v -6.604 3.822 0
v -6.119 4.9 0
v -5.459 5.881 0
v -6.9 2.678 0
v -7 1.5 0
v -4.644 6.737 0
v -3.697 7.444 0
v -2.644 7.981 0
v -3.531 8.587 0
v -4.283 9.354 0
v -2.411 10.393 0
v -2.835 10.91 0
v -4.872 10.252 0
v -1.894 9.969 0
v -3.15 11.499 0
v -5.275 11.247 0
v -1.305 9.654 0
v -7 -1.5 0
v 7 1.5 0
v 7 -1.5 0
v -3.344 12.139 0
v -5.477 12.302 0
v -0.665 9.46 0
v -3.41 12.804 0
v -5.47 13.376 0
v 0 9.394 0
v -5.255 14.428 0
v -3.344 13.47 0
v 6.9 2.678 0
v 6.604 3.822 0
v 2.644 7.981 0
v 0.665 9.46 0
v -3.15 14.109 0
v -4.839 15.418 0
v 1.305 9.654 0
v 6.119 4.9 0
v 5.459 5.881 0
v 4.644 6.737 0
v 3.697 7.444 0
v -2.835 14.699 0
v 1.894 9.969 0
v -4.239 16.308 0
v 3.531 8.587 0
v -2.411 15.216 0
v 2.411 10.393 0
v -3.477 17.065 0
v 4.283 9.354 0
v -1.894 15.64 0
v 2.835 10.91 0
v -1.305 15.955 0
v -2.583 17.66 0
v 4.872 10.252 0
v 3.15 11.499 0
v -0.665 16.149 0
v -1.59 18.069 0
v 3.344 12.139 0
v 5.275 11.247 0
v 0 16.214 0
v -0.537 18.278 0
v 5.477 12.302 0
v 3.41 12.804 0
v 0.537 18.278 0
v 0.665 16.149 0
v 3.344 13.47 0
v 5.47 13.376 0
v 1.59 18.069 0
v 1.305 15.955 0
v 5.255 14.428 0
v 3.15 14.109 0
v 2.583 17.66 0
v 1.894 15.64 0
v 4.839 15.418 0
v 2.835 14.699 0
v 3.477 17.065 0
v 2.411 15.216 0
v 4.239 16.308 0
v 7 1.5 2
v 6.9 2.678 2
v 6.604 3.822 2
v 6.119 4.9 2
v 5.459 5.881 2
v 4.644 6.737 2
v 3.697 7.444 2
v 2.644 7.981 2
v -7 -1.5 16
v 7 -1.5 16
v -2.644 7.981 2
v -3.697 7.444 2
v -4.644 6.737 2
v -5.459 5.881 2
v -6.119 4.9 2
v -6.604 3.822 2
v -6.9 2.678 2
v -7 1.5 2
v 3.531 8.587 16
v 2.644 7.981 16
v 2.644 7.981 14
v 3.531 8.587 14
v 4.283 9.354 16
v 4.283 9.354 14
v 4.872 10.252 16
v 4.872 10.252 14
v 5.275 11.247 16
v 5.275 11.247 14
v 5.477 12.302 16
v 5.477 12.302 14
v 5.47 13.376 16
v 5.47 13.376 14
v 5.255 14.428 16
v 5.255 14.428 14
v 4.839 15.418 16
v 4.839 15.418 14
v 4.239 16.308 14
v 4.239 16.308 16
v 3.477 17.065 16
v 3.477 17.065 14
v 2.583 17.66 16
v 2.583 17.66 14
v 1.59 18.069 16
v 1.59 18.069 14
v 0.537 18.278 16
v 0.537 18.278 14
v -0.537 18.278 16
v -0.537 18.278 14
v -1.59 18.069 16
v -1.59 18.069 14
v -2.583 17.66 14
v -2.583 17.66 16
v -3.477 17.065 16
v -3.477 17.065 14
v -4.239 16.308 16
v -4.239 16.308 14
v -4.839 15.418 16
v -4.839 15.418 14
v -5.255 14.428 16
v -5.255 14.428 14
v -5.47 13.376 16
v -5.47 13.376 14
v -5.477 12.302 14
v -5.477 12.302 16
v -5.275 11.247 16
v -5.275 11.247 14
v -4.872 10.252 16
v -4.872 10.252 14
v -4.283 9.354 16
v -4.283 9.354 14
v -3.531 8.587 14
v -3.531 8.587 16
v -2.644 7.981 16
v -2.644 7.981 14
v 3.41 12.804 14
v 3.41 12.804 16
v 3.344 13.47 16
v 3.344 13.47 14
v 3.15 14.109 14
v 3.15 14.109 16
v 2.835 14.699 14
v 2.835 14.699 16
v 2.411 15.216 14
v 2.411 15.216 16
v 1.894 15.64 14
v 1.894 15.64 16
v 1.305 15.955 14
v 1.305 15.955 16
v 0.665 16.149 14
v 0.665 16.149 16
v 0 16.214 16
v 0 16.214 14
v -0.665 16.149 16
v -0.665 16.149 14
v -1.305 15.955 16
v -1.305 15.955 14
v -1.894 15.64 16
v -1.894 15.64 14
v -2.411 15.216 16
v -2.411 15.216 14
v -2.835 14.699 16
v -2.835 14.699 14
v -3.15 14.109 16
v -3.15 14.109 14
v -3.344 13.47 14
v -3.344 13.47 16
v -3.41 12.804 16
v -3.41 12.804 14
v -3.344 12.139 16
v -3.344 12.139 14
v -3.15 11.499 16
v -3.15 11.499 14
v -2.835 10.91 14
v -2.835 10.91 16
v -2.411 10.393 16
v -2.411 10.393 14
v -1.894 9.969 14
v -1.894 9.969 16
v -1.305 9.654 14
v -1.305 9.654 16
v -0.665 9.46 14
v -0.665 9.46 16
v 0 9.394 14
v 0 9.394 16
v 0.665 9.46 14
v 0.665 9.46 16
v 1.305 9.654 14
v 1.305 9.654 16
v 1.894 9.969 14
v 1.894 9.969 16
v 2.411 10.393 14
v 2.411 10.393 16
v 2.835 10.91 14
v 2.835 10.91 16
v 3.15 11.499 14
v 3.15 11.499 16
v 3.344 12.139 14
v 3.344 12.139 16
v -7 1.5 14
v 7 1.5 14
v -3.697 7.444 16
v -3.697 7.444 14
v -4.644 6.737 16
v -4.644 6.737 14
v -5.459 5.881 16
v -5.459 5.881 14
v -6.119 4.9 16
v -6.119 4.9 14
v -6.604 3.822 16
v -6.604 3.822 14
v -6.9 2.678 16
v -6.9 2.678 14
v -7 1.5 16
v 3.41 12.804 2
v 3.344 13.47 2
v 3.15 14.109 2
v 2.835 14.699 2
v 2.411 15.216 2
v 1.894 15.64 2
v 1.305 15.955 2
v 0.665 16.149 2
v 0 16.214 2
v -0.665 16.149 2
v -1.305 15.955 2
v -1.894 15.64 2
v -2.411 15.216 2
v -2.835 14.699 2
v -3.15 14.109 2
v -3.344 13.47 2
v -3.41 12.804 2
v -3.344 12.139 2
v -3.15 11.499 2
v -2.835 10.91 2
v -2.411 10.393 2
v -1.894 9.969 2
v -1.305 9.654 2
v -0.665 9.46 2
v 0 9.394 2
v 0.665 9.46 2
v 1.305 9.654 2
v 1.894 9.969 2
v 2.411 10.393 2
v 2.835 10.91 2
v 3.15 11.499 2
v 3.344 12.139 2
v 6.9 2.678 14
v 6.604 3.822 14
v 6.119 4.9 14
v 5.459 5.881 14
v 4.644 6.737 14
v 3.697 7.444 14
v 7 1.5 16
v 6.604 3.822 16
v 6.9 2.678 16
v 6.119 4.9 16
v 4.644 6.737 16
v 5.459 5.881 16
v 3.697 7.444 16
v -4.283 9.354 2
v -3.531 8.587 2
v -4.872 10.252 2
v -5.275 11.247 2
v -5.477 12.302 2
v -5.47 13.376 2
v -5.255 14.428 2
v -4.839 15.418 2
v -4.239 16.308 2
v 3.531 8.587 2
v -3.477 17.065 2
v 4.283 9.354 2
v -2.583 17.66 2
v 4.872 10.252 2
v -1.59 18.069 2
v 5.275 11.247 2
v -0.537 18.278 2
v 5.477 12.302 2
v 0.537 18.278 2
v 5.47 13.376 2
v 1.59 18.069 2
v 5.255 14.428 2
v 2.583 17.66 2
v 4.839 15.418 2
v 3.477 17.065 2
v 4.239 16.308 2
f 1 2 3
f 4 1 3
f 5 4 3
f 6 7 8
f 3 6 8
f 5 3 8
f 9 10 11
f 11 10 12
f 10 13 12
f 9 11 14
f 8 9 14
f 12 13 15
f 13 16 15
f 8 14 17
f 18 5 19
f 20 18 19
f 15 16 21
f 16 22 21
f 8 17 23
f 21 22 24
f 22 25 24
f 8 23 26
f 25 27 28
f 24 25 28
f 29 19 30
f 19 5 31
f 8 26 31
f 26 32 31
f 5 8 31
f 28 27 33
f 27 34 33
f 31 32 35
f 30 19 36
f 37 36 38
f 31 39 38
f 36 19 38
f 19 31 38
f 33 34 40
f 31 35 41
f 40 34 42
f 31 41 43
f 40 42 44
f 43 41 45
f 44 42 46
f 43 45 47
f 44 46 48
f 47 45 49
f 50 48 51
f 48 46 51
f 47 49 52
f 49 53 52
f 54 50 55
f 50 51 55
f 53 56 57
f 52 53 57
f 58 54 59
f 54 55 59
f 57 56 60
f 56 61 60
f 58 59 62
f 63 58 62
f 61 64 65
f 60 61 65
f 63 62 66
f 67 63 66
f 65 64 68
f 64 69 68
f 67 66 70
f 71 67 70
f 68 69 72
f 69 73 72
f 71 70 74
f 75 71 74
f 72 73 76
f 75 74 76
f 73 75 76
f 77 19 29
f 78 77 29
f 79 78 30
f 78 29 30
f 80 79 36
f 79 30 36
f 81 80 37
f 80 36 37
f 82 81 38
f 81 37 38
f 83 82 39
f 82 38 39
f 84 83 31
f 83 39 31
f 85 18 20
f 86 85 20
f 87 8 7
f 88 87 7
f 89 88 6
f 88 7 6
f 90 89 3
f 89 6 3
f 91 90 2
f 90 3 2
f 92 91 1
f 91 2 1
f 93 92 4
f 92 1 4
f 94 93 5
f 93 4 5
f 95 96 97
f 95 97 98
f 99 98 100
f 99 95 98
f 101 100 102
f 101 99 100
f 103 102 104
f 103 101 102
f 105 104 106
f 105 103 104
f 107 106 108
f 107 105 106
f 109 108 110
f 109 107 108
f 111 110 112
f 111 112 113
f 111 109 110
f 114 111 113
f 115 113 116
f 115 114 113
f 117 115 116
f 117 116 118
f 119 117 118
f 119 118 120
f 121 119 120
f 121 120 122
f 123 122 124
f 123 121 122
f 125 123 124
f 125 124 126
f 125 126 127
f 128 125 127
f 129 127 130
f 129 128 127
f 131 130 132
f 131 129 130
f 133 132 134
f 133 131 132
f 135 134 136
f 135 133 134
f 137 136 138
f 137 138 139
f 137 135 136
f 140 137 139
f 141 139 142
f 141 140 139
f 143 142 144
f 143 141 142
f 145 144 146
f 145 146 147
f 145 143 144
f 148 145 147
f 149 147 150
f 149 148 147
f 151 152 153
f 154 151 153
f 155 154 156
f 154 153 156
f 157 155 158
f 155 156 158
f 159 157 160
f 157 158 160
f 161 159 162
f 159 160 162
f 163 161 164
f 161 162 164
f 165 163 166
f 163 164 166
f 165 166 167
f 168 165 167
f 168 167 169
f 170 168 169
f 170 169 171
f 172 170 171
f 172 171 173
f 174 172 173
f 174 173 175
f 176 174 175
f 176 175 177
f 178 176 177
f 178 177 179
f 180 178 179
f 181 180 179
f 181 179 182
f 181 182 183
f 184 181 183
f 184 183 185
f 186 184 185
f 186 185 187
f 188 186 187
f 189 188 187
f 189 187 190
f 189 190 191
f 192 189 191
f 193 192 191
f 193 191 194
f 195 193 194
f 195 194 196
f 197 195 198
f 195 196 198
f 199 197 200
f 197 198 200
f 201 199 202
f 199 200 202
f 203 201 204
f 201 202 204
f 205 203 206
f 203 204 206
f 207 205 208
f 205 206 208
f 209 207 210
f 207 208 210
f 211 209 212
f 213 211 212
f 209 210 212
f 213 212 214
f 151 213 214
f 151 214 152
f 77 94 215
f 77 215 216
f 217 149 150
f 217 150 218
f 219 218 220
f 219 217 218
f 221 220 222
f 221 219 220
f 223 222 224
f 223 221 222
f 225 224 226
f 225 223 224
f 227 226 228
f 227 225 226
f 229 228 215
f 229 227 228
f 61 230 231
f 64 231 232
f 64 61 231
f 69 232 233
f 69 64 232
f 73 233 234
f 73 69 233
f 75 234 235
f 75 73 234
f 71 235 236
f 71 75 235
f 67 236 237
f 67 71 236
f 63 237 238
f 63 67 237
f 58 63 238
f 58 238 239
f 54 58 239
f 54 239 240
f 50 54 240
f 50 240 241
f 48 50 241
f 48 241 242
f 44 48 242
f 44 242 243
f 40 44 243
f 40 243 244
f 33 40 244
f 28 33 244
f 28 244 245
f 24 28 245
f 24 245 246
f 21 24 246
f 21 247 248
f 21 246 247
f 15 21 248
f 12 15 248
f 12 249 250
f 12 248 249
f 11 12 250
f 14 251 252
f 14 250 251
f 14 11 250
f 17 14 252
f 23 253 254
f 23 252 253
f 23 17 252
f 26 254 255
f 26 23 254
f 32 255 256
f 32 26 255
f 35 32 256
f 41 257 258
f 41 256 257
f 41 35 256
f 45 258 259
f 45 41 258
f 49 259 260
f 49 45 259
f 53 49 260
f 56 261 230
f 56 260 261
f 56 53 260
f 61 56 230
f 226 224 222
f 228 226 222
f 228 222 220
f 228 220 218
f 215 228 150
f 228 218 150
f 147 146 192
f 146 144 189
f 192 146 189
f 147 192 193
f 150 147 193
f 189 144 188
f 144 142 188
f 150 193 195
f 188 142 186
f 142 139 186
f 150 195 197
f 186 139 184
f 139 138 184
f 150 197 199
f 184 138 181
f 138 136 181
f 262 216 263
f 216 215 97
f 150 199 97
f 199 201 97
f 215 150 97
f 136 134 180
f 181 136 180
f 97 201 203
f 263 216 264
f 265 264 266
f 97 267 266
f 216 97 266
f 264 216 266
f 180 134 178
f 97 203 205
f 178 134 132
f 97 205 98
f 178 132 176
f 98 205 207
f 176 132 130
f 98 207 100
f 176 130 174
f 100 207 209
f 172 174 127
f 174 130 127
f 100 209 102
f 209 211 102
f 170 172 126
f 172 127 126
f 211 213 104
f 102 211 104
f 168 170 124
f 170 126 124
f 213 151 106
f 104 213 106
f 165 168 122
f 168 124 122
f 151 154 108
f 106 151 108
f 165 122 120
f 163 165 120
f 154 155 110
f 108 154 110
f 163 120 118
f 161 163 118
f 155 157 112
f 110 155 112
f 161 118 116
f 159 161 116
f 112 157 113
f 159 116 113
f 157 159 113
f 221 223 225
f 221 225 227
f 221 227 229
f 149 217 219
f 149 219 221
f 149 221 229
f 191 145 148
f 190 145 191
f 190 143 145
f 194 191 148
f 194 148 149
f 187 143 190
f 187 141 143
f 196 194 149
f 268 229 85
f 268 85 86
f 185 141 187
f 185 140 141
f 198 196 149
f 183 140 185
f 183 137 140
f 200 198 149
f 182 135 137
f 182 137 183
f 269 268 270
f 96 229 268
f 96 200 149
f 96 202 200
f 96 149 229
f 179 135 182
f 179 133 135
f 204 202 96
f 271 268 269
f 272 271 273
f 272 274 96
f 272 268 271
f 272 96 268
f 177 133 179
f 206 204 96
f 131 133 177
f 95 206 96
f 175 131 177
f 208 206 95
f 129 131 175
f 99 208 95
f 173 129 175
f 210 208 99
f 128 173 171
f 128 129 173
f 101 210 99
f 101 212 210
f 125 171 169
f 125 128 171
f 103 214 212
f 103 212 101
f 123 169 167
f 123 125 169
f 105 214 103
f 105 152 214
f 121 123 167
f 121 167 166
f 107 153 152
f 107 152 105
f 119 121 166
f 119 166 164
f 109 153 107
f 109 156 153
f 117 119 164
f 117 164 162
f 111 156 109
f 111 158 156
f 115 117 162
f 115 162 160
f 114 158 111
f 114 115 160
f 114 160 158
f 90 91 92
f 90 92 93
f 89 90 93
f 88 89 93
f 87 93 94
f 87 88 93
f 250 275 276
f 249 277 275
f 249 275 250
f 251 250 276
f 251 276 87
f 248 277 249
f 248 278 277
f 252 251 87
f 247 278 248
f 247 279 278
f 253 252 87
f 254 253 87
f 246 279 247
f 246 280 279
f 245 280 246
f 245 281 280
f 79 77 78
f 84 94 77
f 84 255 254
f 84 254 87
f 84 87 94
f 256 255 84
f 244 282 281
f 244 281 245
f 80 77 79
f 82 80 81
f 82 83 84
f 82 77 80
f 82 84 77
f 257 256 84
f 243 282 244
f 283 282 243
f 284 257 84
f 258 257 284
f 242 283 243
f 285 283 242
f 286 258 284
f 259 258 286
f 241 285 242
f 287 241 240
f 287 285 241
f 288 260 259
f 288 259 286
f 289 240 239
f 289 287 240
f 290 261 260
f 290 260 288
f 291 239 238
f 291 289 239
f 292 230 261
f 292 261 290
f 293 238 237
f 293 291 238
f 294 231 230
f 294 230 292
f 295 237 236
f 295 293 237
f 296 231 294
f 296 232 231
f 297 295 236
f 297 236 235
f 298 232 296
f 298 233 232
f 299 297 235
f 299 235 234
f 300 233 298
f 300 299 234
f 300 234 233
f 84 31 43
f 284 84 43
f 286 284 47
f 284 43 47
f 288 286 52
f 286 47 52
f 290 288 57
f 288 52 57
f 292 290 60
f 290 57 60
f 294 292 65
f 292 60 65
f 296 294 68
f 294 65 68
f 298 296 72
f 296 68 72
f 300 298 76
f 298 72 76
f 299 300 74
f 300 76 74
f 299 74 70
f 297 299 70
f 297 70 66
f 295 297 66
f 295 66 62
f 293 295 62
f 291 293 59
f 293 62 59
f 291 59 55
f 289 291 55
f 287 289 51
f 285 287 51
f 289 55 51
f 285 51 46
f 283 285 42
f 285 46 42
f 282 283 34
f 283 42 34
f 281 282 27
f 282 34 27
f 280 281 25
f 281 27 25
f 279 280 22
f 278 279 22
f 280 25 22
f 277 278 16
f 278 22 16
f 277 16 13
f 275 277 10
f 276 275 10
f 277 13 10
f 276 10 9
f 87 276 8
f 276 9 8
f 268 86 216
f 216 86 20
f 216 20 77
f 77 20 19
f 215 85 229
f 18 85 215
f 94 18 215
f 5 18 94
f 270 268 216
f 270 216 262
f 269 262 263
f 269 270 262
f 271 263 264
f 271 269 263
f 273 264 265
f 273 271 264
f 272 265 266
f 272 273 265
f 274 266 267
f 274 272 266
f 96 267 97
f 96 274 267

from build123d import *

# Parameters (mm, degrees)
SKETCH1_W           = 14
SKETCH1_H           = 3
BOSS_EXTRUDE1_DEPTH = 16
BOSS_EXTRUDE2_DEPTH = 2
SKETCH3_R           = 3.41
CUT_EXTRUDE2_DEPTH  = 7.8


with BuildPart() as part:
    # Sketch1 → Boss-Extrude1 (new body)
    with BuildSketch(Plane.XY):
        Rectangle(SKETCH1_W, SKETCH1_H)
    extrude(amount=BOSS_EXTRUDE1_DEPTH)

    # Sketch2 → Boss-Extrude2 (add)
    with BuildSketch(Plane.XY.offset(16)):
        with BuildLine():
            Line((-7, 1.5), (7, 1.5))
            ThreePointArc((7, 1.5), (5.80980001, 5.404641321), (2.643936044, 7.981481481))
            ThreePointArc((2.643936044, 7.981481481), (0, 18.30430246), (-2.643936044, 7.981481481))
            ThreePointArc((-2.643936044, 7.981481481), (-5.80980001, 5.404641321), (-7, 1.5))
        make_face()
    boss_extrude2 = extrude(amount=-BOSS_EXTRUDE2_DEPTH)

    # Sketch3 → Cut-Extrude2 (cut)
    with BuildSketch(Plane.XY.offset(16)):
        with Locations((0, 12.80430246)):
            Circle(SKETCH3_R)
    cut_extrude2 = extrude(amount=-CUT_EXTRUDE2_DEPTH, mode=Mode.SUBTRACT)

    # Mirror1: Boss-Extrude2, Cut-Extrude2 across plane
    add(boss_extrude2.mirror(Plane(origin=(0, 0, 8), x_dir=(1, 0, 0), z_dir=(0, 0, -1))))
    add(cut_extrude2.mirror(Plane(origin=(0, 0, 8), x_dir=(1, 0, 0), z_dir=(0, 0, -1))), mode=Mode.SUBTRACT)


solid = part.part
